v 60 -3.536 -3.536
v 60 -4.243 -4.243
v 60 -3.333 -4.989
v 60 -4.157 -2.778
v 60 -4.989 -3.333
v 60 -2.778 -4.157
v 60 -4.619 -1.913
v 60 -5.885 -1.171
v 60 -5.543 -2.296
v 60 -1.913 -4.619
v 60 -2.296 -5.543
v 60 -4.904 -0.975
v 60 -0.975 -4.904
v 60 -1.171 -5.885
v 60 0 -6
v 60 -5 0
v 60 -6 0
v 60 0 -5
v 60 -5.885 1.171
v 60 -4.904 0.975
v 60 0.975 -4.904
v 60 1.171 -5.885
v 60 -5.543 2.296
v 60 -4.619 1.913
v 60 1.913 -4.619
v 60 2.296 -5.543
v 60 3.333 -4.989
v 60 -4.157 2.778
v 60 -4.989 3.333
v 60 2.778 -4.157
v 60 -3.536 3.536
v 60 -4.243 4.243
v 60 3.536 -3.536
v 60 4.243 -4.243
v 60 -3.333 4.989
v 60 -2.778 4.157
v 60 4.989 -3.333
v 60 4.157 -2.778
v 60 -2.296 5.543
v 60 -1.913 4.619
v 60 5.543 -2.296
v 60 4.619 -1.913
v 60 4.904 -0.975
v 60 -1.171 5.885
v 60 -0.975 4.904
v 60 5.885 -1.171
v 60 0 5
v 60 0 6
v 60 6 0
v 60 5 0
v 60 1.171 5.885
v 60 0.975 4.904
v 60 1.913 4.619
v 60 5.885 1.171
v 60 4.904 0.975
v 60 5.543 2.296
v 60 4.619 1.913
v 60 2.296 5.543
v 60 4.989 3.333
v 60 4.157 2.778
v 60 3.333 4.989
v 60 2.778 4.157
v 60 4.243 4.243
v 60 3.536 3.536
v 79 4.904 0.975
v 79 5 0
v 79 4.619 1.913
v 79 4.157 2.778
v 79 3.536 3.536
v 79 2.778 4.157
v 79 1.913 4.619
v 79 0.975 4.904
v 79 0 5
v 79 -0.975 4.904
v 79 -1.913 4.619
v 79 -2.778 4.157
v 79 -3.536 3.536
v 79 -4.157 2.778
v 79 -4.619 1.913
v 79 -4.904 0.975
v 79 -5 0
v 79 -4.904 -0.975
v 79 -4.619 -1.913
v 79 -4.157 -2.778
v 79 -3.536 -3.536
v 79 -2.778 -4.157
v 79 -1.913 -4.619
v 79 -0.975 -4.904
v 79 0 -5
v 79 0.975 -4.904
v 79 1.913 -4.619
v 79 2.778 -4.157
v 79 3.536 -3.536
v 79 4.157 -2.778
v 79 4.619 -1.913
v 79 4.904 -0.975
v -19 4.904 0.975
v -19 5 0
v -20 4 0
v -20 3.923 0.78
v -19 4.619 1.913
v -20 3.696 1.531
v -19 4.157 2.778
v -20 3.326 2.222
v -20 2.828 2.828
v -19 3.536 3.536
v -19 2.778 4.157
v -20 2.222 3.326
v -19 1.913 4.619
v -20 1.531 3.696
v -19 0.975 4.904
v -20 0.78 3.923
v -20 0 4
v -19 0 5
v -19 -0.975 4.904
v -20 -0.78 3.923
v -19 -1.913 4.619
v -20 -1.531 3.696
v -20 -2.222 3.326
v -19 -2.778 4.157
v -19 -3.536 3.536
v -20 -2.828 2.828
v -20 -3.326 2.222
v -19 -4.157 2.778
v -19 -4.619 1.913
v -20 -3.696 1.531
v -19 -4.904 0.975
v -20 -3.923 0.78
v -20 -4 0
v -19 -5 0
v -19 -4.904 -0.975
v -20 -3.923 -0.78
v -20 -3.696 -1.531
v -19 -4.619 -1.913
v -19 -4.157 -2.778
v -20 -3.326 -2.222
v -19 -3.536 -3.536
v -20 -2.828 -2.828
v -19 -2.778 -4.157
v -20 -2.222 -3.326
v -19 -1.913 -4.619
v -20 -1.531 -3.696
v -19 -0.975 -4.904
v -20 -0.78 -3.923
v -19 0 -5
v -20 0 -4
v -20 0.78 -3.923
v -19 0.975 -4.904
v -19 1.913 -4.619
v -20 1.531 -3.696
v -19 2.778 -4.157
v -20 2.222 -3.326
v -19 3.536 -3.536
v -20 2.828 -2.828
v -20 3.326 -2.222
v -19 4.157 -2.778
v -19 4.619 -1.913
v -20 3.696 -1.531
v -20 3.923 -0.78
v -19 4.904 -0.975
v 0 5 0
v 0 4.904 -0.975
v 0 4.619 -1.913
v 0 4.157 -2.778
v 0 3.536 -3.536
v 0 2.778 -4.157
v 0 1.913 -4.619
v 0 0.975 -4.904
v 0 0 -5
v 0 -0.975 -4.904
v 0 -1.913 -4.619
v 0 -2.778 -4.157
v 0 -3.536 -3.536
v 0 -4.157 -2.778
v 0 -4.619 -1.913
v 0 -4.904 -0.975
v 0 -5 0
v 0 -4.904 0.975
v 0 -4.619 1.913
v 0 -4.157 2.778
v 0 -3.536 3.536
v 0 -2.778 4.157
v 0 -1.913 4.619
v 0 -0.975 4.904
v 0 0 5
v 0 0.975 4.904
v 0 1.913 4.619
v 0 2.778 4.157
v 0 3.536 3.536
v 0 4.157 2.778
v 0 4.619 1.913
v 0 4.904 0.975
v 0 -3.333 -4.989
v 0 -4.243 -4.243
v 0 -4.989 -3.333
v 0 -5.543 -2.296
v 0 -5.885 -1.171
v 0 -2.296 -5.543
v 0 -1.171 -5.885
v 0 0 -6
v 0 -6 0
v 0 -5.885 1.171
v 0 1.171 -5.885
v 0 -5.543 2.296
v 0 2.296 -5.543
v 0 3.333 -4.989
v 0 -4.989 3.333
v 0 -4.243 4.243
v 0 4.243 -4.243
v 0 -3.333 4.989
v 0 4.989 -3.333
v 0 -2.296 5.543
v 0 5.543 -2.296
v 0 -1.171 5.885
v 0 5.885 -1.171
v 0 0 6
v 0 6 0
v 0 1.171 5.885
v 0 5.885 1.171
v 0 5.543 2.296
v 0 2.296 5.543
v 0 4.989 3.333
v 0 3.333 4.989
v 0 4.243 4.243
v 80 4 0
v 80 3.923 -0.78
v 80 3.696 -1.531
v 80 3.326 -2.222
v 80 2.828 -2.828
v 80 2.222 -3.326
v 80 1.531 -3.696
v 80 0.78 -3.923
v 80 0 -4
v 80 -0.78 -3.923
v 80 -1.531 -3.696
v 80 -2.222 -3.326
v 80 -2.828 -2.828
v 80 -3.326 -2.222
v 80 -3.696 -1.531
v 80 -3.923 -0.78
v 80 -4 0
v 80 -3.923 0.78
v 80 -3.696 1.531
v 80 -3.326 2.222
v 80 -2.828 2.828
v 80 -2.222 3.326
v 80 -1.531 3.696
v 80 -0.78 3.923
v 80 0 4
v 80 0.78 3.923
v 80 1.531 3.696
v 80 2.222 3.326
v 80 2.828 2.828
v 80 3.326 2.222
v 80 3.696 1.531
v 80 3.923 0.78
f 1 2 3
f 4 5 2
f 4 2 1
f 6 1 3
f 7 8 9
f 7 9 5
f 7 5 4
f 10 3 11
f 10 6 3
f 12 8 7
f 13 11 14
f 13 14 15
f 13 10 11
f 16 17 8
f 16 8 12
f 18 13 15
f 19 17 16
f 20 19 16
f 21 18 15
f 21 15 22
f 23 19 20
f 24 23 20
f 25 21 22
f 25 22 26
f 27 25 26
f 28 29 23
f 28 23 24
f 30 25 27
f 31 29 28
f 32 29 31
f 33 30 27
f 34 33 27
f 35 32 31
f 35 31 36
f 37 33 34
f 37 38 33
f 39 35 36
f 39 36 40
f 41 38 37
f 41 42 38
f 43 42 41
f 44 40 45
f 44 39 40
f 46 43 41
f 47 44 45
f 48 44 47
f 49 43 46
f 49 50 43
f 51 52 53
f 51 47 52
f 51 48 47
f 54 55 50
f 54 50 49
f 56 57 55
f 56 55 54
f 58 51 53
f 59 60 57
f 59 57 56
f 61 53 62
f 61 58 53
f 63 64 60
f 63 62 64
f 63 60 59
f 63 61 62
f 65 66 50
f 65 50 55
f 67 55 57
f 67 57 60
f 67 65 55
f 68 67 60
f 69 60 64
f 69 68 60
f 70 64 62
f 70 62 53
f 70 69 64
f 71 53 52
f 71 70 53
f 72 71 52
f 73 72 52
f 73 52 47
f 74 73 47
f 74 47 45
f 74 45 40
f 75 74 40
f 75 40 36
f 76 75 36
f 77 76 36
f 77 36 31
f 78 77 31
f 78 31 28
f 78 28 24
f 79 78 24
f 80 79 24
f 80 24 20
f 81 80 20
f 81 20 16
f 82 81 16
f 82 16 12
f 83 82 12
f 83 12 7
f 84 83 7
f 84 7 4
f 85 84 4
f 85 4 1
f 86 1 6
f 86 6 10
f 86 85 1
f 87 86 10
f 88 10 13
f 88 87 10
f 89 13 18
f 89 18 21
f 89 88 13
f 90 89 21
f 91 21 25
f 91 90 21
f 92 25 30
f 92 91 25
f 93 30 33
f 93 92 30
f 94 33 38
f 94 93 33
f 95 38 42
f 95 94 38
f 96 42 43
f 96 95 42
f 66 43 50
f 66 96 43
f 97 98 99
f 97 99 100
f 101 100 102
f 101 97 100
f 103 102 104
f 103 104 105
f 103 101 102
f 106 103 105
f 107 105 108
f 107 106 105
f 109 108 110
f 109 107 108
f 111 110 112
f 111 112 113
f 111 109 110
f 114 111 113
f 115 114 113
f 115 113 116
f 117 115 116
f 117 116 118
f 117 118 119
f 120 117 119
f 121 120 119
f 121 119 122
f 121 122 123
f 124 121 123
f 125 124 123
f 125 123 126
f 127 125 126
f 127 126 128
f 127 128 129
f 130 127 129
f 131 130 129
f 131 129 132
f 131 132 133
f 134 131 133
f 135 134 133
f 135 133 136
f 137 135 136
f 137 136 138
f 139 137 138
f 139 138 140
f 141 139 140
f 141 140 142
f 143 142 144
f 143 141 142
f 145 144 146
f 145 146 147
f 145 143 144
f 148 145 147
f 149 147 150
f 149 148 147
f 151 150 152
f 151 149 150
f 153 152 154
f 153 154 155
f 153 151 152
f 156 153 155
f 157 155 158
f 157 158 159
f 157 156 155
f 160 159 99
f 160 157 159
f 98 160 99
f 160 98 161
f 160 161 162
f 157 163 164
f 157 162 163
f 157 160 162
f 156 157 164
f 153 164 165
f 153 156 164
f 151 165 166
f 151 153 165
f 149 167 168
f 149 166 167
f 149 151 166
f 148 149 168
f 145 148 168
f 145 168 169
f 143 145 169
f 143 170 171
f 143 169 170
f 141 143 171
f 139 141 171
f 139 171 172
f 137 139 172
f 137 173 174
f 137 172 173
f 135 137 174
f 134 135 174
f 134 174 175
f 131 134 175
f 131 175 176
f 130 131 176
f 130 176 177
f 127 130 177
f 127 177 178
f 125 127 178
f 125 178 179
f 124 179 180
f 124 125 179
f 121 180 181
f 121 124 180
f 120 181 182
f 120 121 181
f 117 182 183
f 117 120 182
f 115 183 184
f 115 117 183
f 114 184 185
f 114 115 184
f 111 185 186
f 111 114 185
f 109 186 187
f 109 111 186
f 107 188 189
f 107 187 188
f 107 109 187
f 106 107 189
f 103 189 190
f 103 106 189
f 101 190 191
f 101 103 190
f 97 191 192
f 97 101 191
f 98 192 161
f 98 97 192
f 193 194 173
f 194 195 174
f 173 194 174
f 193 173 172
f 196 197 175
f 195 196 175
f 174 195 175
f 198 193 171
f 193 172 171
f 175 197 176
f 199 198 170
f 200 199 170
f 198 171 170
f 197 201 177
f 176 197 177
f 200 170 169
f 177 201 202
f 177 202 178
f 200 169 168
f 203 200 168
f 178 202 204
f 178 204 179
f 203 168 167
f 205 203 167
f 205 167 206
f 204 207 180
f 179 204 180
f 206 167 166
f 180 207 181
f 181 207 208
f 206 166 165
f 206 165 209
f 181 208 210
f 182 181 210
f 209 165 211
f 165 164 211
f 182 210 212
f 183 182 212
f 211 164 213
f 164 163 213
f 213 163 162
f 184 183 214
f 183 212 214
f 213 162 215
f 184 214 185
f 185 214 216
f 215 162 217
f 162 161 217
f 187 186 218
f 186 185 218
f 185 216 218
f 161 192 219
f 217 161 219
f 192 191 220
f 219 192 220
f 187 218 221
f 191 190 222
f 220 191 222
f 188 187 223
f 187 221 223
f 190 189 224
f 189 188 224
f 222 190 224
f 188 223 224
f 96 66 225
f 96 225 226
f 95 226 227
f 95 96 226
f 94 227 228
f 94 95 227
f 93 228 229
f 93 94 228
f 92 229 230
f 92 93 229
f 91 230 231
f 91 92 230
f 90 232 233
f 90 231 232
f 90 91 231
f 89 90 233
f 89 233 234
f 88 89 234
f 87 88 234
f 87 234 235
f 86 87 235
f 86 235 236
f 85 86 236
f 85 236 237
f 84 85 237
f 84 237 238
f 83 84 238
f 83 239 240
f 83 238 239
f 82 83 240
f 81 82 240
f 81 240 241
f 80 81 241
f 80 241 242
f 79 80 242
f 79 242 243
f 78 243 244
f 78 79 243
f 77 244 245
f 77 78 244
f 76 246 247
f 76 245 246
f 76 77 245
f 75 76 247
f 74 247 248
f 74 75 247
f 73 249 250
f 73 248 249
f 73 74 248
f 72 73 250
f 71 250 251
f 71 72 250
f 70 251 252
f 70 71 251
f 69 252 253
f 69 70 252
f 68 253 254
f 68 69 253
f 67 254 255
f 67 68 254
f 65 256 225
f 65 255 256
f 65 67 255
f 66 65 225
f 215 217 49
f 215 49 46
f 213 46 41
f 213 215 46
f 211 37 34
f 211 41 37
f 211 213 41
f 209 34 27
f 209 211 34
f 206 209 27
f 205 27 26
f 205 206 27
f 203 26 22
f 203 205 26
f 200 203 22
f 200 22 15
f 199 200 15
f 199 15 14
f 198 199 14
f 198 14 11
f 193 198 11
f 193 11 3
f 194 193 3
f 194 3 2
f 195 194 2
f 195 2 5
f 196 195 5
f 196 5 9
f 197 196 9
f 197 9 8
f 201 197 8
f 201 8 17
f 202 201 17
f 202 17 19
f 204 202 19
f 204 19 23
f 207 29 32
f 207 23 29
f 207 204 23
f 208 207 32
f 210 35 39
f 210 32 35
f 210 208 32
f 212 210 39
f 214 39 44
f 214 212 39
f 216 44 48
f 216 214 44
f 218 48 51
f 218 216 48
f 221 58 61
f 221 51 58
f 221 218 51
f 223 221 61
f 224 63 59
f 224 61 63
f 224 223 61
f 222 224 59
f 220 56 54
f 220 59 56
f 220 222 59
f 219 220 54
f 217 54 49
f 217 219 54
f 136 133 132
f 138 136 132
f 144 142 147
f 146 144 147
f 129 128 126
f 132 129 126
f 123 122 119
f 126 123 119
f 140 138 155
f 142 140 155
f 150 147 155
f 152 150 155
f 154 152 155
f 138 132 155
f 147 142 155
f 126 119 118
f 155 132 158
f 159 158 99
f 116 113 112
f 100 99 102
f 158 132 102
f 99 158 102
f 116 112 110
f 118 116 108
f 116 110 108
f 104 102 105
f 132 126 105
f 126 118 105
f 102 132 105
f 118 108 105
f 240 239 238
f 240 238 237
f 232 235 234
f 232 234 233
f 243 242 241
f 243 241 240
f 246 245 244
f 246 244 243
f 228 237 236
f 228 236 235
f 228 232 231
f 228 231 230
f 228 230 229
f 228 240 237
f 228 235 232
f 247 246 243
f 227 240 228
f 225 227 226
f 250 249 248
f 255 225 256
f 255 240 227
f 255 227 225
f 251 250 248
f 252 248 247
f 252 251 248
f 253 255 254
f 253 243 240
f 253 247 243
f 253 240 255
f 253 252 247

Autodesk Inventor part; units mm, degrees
ref_plane "YZ Plane" through (0, 0, 0) normal (1, 0, 0) x (0, 1, 0)
ref_plane "XY Plane" through (0, 0, 0) normal (0, 0, 1) x (1, 0, 0)
sketch "Sketch1" plane through (0, 0, 0) normal (0, 0, 1) x (1, 0, 0)
  line L0 (0, 0) -> (60, 0)
  line L1 (60, 0) -> (60, 6)
  line L2 (60, 6) -> (0, 6)
  line L3 (0, 6) -> (0, 0)
  line L4 (0, 0) -> (0, 5)
  line L5 (0, 5) -> (-20, 5)
  line L6 (-20, 5) -> (-20, 0)
  line L7 (-20, 0) -> (0, 0)
  line L8 (60, 5) -> (80, 5)
  line L9 (80, 5) -> (80, 0)
  line L10 (80, 0) -> (60, 0)
  dimension "d0" = 60
  dimension "d1" = 6
  dimension "d3" = 5
  dimension "d4" = 20
  dimension "d5" = 20
revolve "Revolution1" add sketch "Sketch1" angle 360 about axis through (0, 0, 0) along (1, 0, 0)
thread "Thread1" size "M12x1.75" class "6g" standard "ANSI Metric M Profile" full length
chamfer "Chamfer1" distance 1 angle 45 2 edges at (-20, -5, 0) (80, -5, 0)
ref_plane "Work Plane1" through (30, 0, 0) normal (1, 0, 0) x (0, 0, -1)
properties part number "Large Gear Shaft"
